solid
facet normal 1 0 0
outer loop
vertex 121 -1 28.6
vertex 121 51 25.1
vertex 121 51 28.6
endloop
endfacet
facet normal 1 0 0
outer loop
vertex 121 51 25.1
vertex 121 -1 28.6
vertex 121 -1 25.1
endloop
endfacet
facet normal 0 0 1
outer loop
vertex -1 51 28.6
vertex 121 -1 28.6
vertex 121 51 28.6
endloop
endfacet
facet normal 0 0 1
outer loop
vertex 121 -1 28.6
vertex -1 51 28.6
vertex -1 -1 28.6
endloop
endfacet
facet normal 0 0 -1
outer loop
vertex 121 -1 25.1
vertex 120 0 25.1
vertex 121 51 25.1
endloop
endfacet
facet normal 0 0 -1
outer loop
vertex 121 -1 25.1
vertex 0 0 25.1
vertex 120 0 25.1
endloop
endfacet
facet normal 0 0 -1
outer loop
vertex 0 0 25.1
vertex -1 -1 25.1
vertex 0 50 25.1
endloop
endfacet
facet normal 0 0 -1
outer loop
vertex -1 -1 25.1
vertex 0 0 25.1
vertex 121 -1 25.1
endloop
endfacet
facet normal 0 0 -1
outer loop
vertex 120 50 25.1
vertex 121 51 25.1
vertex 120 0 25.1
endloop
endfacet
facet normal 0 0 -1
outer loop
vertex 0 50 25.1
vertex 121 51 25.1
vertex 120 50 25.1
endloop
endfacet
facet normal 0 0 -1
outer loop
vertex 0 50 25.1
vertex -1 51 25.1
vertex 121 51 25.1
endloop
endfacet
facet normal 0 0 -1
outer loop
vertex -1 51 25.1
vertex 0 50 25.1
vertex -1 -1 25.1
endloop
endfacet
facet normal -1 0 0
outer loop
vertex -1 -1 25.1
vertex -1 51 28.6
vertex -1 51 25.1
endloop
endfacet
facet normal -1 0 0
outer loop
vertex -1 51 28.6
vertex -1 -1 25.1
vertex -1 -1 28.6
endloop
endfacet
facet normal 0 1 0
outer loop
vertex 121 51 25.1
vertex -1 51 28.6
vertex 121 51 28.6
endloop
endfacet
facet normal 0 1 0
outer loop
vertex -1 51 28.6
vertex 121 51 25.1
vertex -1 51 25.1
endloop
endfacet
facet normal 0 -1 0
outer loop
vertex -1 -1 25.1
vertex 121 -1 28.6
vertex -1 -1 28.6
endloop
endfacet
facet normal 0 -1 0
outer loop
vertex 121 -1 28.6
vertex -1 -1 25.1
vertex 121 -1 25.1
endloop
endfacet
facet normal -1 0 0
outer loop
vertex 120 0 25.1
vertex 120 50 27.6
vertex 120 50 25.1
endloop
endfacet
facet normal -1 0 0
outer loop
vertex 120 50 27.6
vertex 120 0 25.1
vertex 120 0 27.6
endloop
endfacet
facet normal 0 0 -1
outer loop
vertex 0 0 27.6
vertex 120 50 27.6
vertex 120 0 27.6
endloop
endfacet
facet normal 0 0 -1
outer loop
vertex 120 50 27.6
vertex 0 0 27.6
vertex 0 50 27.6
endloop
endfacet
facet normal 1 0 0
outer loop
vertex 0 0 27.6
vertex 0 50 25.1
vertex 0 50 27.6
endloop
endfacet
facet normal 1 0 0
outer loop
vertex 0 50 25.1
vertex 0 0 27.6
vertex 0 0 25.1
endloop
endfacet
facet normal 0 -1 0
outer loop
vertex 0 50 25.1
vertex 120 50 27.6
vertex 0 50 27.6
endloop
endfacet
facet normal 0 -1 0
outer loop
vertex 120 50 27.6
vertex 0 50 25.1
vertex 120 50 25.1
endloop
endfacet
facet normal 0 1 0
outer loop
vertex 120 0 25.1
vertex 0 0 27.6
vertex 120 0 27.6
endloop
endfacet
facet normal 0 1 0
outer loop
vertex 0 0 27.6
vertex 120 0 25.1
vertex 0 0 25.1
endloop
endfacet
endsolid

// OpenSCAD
// file: arc.scad
module sector(radius, angles, fn = 24) {
    r = radius / cos(180 / fn);
    step = -360 / fn;

    points = concat([[0, 0]],
        [for(a = [angles[0] : step : angles[1] - 360]) 
            [r * cos(a), r * sin(a)]
        ],
        [[r * cos(angles[1]), r * sin(angles[1])]]
    );

    difference() {
        circle(radius, $fn = fn);
        polygon(points);
    }
}

module arc(radius, angles, width, fn = 24) {
    difference() {
        sector(radius + width, angles, fn);
        sector(radius, angles, fn);
    }
} 
// main file
//
// dark box for optode testing
//
include <arc.scad>

e = 0.1;
mm = 25.4;
$fn = 32;

// optode dims
op_lg_dia = 12;
op_lg_len = 10.5;
op_sm_dia = 7;
op_sm_len = 6.5;

// box dims
box_len = 120;
box_wid = 50;
box_hgt = 20;
box_thk = 1;

op_off = box_len*0.5;			/* optode position from box end */
op_bkt_wid = 20;		/* optode bracket width */
op_bkt_thk = 1;			/* optode bracket thickness */

op_bkt_offset = box_wid/2-op_bkt_wid/2;

cable_dia = 1.6;		/* slot width for cable */

// cable exit
ct_rad = 4;
ct_leng = 10;
ct_hgt = box_hgt-box_thk-cable_dia;

// Filter holder
filter_pos = box_len*0.66;
filter_wid = 25;
filter_hole_dia = 15;

filter_w1 = 1.5;
filter_w2 = 2.5;
filter_thk = 0.75;

// LED holder
led_pos = box_len*0.85;
led_dia = 5;

module filter_slot() {
     translate( [filter_pos, 0, 0]) {
	  difference() {
	       cube( [box_thk, box_wid, box_hgt]);
	       translate( [-e, box_wid/2, box_hgt/2])
		    rotate( [0, 90, 0])
		    cylinder( d=filter_hole_dia, h=box_thk+2*e);
	  }
	  translate( [-filter_thk+e, box_wid/2-filter_wid/2, 0]) {
	       difference() {
		    cube( [filter_thk, filter_wid, box_hgt]);
		    translate( [-e, filter_w1, 0])
			 cube( [filter_thk+2*e, filter_wid-2*filter_w1, box_hgt+e]);
	       }
	       translate( [-box_thk+e, 0, 0]) {
		    difference() {
			 cube( [box_thk, filter_wid, box_hgt]);
			 translate( [-e, filter_w2, 0])
			      cube( [box_thk+2*e, filter_wid-2*filter_w2, box_hgt+e]);
		    }
	       }
	  }
     }
}

module led_bracket() {
  translate( [led_pos, op_bkt_offset, 0]) {
    difference() {
      cube( [op_bkt_thk, op_bkt_wid, box_hgt]);
      translate( [-e, op_bkt_wid/2, box_hgt/2])
	rotate( [0, 90, 0])
	cylinder( d=led_dia+0.2, h=op_bkt_thk+2*e);
    }
  }
}

module optode() {
  cylinder( h=op_sm_len, d=op_sm_dia);
  translate( [0, 0, op_sm_len-e])
    cylinder( h=op_lg_len, d=op_lg_dia);
}

module empty_box() {
  difference() {
    cube( [box_len, box_wid, box_hgt]);
    translate( [box_thk, box_thk, box_thk])
      cube( [box_len-2*box_thk, box_wid-2*box_thk, box_hgt]);
  }
}


module op_bracket() {
  translate( [op_off-op_lg_len-op_sm_len+3, op_bkt_offset, 0]) {
    difference() {
      cube( [op_bkt_thk, op_bkt_wid, box_hgt]);
      translate( [-e, op_bkt_wid/2, box_hgt/2])
	rotate( [0, 90, 0])
	cylinder( d=op_lg_dia+0.2, h=op_bkt_thk+2*e);
    }
  }
  translate( [op_off-op_sm_len+e, op_bkt_offset, 0]) {
    difference() {
      cube( [op_bkt_thk, op_bkt_wid, box_hgt]);
      translate( [-e, op_bkt_wid/2, box_hgt/2])
	rotate( [0, 90, 0])
	cylinder( d=op_sm_dia+0.2, h=op_bkt_thk+2*e);
    }
  }
}

module serpent( nturn) {

  for( i=[0:nturn-1]) {
    translate( [i*4*ct_rad+i*2*cable_dia, 0, 0]) {
      linear_extrude(ct_hgt+e) arc(ct_rad, [180, 360], cable_dia);
      translate( [ct_rad*2+cable_dia, ct_leng, 0])
	linear_extrude(ct_hgt+e) arc(ct_rad, [0, 180], cable_dia);
      translate( [ct_rad, -e, 0])
	cube( [cable_dia, ct_leng+2*e, ct_hgt+e]);
      translate( [ct_rad*3+cable_dia, -e, 0])
	cube( [cable_dia, ct_leng+2*e, ct_hgt+e]);
    }    
  }
}

function exit_wid( nturn) = ct_leng+(ct_rad+cable_dia)*2+2*cable_dia;
function exit_hgt() = ct_hgt+box_thk;

module cable_exit( nturn) {
  // dims to enclose the serpent
  sd_len = nturn*ct_rad*4+cable_dia*nturn*2+cable_dia;
  sd_wid = ct_leng+(ct_rad+cable_dia)*2;
  translate( [-ct_rad-cable_dia, cable_dia, box_thk]) {
    difference() {
      translate( [ct_rad+cable_dia, -cable_dia, 0])
	cube( [sd_len-2*ct_rad-2*cable_dia, sd_wid+2*cable_dia, ct_hgt-e]);
      translate( [ct_rad+cable_dia, ct_rad+cable_dia, -e])
	serpent( nturn);
    }
  }
  cube( [sd_len-2*ct_rad-2*cable_dia, sd_wid+2*cable_dia, box_thk+e]);
}


module op_with_bracket() {
// move to optode position
  translate( [op_off, op_bkt_offset+op_bkt_wid/2, box_hgt/2]) {
    rotate( [0, -90, 0])  {
      //      color("#606060")    optode();
    }
  }
  // bracket
  op_bracket();
}

module box() {
  difference() {
    empty_box();
    // optode cable slot
    translate( [-e, box_wid-exit_wid(2)-box_thk+cable_dia, box_thk+cable_dia])
      cube( [box_wid+2*e, cable_dia, ct_hgt]);
    // LED BNC hole
    translate( [box_len-box_thk-e, box_wid-8, box_hgt/2])
	 rotate( [0, 90, 0])
	 cylinder( d=0.375*mm, h=box_thk+2*e);
  }
}

module box_assembly() {
     box();
     translate( [box_thk, box_wid-exit_wid(2)-box_thk, box_thk]) cable_exit(2);

     op_with_bracket();
     led_bracket();
     filter_slot();
}

lid_lip = 2.5;

module lid() {
     difference() {
	  translate( [-box_thk, -box_thk, e])
	       cube( [box_len+2*box_thk, box_wid+2*box_thk, lid_lip+box_thk]);
	  cube([box_len, box_wid, lid_lip+e]);
     }
}

// box_assembly();

translate( [0, 0, box_hgt+5]) lid();
